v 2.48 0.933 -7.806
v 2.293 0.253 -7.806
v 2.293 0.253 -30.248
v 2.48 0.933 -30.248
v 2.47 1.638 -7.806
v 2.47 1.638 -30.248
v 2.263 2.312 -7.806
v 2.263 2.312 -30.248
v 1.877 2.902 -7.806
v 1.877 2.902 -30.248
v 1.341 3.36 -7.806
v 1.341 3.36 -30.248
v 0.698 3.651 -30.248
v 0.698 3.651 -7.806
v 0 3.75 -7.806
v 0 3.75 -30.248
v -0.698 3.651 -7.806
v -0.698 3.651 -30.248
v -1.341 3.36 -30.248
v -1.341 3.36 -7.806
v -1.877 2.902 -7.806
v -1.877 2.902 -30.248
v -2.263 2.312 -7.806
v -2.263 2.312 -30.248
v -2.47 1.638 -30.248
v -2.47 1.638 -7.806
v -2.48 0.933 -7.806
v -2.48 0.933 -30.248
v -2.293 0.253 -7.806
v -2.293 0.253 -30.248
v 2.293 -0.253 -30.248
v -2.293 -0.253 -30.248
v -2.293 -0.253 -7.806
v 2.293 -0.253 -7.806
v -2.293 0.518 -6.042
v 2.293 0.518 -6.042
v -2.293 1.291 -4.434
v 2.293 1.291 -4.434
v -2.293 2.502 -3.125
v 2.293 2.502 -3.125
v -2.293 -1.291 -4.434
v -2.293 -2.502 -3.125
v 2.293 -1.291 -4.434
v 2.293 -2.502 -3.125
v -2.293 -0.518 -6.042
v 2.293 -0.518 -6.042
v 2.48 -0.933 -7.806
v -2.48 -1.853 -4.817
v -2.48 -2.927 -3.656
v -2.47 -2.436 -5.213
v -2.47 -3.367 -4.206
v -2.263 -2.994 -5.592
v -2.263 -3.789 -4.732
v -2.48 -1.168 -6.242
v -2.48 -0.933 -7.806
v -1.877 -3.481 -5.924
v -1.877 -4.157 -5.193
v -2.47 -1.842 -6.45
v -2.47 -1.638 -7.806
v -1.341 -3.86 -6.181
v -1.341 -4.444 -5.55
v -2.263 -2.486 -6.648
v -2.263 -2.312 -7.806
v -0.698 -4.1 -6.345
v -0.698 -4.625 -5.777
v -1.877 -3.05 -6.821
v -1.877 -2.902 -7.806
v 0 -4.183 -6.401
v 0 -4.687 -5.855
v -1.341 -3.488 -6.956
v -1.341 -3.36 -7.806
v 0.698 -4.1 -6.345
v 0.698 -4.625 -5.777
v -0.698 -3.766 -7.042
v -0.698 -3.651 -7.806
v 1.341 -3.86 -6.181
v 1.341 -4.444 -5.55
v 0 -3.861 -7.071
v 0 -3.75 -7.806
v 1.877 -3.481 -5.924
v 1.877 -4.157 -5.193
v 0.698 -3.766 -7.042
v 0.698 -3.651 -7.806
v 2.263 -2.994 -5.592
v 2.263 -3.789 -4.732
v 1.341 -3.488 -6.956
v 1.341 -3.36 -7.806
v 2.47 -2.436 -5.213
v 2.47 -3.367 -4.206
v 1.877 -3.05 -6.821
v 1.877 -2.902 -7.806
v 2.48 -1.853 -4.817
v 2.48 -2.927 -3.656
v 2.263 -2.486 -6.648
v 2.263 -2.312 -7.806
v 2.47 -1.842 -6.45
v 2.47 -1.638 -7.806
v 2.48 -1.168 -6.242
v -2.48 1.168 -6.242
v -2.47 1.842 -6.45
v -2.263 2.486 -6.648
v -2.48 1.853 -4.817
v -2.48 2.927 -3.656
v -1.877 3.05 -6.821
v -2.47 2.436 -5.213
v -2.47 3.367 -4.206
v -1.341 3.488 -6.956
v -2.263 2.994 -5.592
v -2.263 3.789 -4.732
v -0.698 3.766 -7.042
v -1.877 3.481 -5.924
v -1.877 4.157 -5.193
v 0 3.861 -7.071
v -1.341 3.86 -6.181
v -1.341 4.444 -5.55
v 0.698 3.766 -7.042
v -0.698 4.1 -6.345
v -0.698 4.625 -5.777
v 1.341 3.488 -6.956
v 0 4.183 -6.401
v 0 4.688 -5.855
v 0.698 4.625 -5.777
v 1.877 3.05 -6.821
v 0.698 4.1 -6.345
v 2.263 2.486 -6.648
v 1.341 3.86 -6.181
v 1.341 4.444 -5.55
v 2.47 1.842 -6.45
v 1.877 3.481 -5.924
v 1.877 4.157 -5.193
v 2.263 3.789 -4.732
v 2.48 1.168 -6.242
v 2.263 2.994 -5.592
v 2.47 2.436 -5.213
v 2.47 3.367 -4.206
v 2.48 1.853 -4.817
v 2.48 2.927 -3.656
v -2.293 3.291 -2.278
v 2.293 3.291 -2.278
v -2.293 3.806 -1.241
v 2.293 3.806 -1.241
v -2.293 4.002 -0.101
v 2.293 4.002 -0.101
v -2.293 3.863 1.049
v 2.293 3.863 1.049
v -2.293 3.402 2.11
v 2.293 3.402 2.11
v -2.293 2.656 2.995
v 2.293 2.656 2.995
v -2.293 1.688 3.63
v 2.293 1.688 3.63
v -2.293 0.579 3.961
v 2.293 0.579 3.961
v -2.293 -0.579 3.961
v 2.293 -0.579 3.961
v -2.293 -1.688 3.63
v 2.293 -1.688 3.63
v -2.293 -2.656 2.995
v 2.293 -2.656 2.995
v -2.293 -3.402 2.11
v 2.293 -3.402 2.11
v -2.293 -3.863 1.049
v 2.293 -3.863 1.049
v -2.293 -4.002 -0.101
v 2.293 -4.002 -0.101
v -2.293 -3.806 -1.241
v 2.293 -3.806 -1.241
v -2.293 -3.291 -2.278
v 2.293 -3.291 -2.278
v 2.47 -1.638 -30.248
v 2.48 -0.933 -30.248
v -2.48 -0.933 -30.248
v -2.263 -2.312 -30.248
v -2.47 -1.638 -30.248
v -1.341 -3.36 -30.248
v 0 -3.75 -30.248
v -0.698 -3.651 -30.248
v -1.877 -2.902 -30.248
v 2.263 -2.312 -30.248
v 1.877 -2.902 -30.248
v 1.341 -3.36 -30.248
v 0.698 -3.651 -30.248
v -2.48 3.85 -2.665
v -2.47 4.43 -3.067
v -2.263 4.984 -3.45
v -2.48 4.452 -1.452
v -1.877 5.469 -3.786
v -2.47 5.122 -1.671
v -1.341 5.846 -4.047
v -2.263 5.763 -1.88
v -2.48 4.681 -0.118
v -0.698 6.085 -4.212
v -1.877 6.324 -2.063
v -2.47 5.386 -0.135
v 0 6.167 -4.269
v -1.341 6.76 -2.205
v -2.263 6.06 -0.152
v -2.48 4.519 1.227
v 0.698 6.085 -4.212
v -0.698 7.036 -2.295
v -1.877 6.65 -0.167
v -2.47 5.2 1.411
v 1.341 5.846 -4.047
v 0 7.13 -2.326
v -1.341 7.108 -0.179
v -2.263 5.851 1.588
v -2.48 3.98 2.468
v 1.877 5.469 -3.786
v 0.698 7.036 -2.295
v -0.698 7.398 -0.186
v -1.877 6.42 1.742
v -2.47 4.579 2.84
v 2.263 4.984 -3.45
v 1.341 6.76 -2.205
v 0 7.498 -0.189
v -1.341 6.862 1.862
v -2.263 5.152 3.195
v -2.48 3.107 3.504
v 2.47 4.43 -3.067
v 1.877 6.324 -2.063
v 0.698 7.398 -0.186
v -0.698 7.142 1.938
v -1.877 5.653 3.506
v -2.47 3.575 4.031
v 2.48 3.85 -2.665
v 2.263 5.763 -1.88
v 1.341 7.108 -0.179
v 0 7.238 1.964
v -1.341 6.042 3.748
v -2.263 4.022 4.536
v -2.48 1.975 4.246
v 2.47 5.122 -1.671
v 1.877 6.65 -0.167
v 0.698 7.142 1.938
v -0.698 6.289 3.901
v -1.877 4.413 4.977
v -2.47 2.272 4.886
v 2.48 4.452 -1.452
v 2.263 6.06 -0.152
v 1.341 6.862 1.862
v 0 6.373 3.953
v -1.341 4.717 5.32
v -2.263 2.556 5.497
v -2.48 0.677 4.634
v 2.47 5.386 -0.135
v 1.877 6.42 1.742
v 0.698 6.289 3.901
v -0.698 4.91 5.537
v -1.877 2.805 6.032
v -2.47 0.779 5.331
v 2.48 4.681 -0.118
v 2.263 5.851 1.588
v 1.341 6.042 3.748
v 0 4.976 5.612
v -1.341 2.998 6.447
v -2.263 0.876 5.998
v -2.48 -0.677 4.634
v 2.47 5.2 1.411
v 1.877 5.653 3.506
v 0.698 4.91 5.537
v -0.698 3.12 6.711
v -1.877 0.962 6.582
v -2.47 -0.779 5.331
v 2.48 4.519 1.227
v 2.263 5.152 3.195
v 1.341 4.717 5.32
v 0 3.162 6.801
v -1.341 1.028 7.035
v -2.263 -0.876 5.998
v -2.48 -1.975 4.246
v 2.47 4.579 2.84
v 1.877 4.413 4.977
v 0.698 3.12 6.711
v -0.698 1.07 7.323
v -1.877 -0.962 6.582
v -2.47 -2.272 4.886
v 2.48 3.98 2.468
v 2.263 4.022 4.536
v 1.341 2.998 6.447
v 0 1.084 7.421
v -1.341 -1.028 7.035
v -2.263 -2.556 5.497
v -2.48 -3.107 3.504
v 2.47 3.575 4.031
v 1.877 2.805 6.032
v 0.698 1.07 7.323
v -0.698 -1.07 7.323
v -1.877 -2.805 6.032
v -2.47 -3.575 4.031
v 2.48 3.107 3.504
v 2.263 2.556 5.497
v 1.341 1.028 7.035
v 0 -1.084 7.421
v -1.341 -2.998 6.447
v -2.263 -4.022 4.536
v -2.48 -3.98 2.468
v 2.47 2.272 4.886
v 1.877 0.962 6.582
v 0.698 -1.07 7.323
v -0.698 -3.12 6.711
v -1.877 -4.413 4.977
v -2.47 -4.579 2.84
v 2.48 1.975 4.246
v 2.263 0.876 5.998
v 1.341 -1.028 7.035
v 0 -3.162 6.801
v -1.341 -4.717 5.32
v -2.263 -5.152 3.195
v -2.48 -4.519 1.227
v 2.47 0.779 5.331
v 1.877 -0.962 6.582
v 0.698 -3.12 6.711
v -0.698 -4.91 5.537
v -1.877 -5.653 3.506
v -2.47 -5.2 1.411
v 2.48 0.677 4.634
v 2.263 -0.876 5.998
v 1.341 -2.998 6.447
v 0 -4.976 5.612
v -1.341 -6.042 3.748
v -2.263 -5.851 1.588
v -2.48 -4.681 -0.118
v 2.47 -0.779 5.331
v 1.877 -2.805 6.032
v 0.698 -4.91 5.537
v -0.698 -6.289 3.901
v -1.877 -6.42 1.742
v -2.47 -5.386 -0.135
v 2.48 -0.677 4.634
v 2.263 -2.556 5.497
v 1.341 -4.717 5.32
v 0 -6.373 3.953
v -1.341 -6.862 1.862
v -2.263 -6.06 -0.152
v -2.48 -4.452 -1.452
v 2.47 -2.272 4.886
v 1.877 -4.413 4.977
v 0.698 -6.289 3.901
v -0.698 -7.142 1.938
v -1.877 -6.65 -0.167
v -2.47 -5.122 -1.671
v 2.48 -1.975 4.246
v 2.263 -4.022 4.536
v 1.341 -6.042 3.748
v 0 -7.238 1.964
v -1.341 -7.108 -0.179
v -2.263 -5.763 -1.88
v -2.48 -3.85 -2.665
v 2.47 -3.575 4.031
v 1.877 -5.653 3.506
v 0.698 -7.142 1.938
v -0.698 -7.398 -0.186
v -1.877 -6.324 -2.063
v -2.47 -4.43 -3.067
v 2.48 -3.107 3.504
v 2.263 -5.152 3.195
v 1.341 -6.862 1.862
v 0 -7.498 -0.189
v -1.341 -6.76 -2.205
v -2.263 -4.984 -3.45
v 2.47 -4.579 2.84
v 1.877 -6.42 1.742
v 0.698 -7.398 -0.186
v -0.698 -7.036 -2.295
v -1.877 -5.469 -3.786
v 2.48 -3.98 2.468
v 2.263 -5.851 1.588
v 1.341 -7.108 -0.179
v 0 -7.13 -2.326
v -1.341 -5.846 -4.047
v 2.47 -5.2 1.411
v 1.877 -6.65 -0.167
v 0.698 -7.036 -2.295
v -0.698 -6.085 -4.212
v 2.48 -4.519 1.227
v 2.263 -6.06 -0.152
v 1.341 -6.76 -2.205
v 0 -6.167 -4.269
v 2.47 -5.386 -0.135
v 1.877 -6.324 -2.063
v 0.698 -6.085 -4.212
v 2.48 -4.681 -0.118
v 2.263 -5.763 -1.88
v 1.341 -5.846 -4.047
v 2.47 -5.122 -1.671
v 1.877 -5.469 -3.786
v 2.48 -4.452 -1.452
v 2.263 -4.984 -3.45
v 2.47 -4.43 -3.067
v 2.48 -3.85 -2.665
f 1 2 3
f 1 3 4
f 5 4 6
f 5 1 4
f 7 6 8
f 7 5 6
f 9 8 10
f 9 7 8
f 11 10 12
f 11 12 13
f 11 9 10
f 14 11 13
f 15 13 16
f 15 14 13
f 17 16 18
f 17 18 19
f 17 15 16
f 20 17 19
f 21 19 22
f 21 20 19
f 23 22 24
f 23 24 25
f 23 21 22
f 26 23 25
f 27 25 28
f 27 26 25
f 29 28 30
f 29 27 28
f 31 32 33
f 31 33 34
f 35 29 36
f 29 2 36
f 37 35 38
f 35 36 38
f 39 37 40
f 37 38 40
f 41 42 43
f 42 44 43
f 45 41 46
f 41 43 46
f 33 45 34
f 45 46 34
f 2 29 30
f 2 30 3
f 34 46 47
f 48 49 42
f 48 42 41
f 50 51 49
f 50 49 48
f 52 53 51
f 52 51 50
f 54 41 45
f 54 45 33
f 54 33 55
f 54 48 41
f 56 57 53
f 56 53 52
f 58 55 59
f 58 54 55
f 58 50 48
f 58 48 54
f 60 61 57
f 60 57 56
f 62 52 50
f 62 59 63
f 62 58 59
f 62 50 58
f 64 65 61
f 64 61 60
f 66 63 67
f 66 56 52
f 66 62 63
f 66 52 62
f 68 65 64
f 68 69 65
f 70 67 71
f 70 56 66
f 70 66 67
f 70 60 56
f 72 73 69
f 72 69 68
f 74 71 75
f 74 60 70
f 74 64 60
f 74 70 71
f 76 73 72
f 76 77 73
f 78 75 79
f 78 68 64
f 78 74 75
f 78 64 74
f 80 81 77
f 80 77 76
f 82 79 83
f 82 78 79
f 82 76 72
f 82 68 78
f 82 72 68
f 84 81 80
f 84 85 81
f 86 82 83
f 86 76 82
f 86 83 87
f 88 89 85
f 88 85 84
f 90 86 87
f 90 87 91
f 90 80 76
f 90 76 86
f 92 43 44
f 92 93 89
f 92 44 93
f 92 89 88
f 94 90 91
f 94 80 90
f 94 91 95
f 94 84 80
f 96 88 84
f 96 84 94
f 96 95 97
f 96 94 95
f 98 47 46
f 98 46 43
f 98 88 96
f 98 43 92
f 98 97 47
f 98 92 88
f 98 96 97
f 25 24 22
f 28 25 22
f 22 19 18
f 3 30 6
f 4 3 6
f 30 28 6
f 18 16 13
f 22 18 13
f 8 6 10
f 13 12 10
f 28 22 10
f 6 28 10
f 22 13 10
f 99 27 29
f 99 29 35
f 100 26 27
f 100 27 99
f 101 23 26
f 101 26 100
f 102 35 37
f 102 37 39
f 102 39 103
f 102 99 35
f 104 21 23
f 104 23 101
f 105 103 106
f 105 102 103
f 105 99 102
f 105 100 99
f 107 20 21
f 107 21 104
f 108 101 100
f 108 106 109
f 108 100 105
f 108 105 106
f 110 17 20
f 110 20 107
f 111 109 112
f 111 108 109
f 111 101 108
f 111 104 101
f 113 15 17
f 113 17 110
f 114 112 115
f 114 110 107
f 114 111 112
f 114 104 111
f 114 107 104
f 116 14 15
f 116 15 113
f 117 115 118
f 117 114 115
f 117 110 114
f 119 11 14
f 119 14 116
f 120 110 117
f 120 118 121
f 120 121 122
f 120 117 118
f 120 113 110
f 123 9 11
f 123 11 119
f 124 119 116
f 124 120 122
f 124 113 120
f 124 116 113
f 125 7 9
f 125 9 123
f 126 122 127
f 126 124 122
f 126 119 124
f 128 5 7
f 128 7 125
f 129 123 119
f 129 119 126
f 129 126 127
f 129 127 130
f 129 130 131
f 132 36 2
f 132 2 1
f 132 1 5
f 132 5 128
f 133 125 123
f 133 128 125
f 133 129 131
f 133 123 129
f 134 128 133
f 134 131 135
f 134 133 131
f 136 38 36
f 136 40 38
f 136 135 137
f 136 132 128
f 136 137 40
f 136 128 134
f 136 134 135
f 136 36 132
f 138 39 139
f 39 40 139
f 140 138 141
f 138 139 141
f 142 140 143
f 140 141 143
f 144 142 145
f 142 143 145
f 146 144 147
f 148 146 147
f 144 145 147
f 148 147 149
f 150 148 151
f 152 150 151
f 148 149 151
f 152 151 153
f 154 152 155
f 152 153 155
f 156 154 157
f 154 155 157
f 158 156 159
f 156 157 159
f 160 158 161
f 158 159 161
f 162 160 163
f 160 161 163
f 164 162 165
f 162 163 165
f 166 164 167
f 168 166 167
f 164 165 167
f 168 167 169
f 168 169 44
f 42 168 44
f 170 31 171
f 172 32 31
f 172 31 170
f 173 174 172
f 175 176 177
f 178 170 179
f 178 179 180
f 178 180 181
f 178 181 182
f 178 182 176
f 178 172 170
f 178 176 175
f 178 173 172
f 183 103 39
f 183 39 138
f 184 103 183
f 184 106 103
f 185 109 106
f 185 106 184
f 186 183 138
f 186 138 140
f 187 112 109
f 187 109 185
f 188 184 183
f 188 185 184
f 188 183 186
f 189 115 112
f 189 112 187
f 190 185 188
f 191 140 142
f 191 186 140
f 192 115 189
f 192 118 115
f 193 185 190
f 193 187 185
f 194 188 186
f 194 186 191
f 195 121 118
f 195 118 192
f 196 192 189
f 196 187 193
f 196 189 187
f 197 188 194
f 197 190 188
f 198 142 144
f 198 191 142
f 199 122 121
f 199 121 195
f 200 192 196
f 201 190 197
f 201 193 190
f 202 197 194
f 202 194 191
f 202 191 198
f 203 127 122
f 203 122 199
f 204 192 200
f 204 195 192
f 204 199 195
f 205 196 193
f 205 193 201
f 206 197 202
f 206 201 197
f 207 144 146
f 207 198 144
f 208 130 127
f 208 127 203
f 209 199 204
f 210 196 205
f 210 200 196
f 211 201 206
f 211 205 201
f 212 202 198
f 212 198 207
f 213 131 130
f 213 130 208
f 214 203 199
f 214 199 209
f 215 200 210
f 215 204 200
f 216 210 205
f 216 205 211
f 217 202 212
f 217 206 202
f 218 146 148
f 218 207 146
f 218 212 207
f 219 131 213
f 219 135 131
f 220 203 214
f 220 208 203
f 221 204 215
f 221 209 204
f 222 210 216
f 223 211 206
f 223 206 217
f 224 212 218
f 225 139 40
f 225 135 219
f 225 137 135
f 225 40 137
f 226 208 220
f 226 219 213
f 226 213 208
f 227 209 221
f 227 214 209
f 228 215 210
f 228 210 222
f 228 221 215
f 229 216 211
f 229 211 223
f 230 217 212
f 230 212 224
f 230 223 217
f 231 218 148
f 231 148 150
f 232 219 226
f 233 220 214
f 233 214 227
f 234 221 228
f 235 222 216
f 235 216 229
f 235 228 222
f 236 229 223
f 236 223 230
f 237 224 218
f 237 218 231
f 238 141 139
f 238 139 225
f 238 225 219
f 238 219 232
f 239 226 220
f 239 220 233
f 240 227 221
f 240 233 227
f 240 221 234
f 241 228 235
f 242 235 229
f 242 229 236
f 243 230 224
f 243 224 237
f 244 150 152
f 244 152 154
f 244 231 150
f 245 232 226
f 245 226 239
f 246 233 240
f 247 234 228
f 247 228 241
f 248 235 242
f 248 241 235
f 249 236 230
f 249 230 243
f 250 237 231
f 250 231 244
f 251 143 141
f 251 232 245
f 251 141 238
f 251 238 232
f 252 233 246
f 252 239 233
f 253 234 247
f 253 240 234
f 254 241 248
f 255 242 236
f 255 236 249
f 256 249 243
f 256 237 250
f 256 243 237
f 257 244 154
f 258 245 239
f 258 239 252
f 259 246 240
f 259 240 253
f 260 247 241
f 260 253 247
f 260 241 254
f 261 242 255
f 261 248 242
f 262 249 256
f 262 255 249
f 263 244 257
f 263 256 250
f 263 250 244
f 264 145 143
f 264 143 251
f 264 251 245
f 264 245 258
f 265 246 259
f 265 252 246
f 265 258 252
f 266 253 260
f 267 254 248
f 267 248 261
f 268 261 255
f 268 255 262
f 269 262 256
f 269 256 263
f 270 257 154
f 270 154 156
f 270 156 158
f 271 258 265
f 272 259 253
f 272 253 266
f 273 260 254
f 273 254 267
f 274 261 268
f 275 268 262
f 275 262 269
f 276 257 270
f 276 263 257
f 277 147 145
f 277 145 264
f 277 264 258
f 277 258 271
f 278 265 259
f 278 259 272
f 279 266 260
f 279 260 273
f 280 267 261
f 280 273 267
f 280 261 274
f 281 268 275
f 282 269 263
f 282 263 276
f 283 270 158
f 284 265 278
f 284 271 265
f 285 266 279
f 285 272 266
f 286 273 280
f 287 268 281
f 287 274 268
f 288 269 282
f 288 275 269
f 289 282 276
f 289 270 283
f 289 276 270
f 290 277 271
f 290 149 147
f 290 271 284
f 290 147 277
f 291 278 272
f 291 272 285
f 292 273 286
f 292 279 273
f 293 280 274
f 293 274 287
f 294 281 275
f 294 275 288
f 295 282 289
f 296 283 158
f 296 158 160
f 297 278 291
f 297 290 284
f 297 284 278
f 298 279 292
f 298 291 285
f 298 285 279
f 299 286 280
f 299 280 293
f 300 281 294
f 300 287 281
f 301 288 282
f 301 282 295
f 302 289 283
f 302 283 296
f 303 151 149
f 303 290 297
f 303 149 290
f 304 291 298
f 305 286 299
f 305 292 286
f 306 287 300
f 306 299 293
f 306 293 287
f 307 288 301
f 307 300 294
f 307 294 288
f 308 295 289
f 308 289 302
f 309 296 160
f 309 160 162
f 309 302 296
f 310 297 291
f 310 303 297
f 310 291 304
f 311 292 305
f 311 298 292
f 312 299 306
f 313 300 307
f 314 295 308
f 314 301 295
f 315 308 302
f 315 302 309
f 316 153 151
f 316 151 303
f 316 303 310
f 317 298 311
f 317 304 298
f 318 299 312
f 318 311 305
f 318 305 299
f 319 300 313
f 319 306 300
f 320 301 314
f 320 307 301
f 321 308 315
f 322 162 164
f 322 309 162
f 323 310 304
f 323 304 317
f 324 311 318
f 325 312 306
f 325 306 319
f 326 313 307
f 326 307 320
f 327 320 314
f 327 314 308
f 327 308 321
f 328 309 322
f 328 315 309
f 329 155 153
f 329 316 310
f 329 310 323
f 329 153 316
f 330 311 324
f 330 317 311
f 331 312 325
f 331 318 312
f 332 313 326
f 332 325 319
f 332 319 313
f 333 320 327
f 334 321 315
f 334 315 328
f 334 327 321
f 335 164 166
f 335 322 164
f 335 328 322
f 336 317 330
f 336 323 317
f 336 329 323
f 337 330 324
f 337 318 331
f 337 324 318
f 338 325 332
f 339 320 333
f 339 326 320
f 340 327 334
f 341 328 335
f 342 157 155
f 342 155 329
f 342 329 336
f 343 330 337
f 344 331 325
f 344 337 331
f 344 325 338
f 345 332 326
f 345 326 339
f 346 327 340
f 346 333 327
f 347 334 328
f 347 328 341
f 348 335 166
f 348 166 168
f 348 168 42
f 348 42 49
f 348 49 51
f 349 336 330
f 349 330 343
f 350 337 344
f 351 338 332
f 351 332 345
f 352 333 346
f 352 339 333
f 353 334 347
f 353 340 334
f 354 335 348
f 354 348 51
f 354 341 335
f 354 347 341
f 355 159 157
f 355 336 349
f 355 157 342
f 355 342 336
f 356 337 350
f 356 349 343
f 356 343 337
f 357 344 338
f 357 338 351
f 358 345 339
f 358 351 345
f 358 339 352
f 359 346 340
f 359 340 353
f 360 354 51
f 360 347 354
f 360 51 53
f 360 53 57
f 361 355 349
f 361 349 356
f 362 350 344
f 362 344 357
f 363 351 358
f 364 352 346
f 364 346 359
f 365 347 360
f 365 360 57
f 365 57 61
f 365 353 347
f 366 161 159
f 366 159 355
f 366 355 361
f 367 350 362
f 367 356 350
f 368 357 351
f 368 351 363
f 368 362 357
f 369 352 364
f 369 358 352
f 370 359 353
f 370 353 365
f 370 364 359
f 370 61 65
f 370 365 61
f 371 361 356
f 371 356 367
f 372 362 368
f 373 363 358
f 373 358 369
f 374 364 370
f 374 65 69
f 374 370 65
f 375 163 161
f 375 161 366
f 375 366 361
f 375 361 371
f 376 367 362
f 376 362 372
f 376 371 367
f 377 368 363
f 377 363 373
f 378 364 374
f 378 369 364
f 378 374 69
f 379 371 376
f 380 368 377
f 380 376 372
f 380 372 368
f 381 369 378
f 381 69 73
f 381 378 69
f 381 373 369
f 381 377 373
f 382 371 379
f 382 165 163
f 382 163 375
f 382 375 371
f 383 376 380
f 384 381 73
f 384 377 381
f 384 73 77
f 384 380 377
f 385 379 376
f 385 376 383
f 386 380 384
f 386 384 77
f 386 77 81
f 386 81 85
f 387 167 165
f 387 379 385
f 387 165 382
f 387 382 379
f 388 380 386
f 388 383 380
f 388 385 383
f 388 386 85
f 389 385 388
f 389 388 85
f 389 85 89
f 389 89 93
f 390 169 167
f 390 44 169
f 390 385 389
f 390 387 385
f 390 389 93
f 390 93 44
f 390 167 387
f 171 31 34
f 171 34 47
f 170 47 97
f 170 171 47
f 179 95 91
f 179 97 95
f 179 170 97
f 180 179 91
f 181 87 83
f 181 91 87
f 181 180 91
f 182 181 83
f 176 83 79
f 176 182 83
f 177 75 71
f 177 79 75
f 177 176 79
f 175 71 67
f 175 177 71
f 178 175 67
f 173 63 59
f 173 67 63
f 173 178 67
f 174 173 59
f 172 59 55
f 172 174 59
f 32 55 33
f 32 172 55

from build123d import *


with BuildPart() as part:
    # Sweep1: sweep along a path in Sketch1
    with BuildLine(Plane(origin=(0, 0, 0), x_dir=(0, 0, -1), z_dir=(1, 0, 0))) as sweep1_path:
        Line((30.24815072, 1.25), (7.806247498, 1.25))
        ThreePointArc((7.806247498, 1.25), (5.641183989, 1.743060906), (3.903123749, 3.125))
        ThreePointArc((3.903123749, 3.125), (-5, 0), (3.903123749, -3.125))
        ThreePointArc((3.903123749, -3.125), (5.641183989, -1.743060906), (7.806247498, -1.25))
        Line((7.806247498, -1.25), (30.24815072, -1.25))
    # Sketch5 → Sweep1 (sweep)
    with BuildSketch(Plane.XY.offset(-30.24815072)):
        with BuildLine():
            Line((-2.292644426, 0.253114081), (2.292644426, 0.253114081))
            ThreePointArc((2.292644426, 0.253114081), (0, 3.75), (-2.292644426, 0.253114081))
        make_face()
    sweep(path=sweep1_path.line)


solid = part.part
